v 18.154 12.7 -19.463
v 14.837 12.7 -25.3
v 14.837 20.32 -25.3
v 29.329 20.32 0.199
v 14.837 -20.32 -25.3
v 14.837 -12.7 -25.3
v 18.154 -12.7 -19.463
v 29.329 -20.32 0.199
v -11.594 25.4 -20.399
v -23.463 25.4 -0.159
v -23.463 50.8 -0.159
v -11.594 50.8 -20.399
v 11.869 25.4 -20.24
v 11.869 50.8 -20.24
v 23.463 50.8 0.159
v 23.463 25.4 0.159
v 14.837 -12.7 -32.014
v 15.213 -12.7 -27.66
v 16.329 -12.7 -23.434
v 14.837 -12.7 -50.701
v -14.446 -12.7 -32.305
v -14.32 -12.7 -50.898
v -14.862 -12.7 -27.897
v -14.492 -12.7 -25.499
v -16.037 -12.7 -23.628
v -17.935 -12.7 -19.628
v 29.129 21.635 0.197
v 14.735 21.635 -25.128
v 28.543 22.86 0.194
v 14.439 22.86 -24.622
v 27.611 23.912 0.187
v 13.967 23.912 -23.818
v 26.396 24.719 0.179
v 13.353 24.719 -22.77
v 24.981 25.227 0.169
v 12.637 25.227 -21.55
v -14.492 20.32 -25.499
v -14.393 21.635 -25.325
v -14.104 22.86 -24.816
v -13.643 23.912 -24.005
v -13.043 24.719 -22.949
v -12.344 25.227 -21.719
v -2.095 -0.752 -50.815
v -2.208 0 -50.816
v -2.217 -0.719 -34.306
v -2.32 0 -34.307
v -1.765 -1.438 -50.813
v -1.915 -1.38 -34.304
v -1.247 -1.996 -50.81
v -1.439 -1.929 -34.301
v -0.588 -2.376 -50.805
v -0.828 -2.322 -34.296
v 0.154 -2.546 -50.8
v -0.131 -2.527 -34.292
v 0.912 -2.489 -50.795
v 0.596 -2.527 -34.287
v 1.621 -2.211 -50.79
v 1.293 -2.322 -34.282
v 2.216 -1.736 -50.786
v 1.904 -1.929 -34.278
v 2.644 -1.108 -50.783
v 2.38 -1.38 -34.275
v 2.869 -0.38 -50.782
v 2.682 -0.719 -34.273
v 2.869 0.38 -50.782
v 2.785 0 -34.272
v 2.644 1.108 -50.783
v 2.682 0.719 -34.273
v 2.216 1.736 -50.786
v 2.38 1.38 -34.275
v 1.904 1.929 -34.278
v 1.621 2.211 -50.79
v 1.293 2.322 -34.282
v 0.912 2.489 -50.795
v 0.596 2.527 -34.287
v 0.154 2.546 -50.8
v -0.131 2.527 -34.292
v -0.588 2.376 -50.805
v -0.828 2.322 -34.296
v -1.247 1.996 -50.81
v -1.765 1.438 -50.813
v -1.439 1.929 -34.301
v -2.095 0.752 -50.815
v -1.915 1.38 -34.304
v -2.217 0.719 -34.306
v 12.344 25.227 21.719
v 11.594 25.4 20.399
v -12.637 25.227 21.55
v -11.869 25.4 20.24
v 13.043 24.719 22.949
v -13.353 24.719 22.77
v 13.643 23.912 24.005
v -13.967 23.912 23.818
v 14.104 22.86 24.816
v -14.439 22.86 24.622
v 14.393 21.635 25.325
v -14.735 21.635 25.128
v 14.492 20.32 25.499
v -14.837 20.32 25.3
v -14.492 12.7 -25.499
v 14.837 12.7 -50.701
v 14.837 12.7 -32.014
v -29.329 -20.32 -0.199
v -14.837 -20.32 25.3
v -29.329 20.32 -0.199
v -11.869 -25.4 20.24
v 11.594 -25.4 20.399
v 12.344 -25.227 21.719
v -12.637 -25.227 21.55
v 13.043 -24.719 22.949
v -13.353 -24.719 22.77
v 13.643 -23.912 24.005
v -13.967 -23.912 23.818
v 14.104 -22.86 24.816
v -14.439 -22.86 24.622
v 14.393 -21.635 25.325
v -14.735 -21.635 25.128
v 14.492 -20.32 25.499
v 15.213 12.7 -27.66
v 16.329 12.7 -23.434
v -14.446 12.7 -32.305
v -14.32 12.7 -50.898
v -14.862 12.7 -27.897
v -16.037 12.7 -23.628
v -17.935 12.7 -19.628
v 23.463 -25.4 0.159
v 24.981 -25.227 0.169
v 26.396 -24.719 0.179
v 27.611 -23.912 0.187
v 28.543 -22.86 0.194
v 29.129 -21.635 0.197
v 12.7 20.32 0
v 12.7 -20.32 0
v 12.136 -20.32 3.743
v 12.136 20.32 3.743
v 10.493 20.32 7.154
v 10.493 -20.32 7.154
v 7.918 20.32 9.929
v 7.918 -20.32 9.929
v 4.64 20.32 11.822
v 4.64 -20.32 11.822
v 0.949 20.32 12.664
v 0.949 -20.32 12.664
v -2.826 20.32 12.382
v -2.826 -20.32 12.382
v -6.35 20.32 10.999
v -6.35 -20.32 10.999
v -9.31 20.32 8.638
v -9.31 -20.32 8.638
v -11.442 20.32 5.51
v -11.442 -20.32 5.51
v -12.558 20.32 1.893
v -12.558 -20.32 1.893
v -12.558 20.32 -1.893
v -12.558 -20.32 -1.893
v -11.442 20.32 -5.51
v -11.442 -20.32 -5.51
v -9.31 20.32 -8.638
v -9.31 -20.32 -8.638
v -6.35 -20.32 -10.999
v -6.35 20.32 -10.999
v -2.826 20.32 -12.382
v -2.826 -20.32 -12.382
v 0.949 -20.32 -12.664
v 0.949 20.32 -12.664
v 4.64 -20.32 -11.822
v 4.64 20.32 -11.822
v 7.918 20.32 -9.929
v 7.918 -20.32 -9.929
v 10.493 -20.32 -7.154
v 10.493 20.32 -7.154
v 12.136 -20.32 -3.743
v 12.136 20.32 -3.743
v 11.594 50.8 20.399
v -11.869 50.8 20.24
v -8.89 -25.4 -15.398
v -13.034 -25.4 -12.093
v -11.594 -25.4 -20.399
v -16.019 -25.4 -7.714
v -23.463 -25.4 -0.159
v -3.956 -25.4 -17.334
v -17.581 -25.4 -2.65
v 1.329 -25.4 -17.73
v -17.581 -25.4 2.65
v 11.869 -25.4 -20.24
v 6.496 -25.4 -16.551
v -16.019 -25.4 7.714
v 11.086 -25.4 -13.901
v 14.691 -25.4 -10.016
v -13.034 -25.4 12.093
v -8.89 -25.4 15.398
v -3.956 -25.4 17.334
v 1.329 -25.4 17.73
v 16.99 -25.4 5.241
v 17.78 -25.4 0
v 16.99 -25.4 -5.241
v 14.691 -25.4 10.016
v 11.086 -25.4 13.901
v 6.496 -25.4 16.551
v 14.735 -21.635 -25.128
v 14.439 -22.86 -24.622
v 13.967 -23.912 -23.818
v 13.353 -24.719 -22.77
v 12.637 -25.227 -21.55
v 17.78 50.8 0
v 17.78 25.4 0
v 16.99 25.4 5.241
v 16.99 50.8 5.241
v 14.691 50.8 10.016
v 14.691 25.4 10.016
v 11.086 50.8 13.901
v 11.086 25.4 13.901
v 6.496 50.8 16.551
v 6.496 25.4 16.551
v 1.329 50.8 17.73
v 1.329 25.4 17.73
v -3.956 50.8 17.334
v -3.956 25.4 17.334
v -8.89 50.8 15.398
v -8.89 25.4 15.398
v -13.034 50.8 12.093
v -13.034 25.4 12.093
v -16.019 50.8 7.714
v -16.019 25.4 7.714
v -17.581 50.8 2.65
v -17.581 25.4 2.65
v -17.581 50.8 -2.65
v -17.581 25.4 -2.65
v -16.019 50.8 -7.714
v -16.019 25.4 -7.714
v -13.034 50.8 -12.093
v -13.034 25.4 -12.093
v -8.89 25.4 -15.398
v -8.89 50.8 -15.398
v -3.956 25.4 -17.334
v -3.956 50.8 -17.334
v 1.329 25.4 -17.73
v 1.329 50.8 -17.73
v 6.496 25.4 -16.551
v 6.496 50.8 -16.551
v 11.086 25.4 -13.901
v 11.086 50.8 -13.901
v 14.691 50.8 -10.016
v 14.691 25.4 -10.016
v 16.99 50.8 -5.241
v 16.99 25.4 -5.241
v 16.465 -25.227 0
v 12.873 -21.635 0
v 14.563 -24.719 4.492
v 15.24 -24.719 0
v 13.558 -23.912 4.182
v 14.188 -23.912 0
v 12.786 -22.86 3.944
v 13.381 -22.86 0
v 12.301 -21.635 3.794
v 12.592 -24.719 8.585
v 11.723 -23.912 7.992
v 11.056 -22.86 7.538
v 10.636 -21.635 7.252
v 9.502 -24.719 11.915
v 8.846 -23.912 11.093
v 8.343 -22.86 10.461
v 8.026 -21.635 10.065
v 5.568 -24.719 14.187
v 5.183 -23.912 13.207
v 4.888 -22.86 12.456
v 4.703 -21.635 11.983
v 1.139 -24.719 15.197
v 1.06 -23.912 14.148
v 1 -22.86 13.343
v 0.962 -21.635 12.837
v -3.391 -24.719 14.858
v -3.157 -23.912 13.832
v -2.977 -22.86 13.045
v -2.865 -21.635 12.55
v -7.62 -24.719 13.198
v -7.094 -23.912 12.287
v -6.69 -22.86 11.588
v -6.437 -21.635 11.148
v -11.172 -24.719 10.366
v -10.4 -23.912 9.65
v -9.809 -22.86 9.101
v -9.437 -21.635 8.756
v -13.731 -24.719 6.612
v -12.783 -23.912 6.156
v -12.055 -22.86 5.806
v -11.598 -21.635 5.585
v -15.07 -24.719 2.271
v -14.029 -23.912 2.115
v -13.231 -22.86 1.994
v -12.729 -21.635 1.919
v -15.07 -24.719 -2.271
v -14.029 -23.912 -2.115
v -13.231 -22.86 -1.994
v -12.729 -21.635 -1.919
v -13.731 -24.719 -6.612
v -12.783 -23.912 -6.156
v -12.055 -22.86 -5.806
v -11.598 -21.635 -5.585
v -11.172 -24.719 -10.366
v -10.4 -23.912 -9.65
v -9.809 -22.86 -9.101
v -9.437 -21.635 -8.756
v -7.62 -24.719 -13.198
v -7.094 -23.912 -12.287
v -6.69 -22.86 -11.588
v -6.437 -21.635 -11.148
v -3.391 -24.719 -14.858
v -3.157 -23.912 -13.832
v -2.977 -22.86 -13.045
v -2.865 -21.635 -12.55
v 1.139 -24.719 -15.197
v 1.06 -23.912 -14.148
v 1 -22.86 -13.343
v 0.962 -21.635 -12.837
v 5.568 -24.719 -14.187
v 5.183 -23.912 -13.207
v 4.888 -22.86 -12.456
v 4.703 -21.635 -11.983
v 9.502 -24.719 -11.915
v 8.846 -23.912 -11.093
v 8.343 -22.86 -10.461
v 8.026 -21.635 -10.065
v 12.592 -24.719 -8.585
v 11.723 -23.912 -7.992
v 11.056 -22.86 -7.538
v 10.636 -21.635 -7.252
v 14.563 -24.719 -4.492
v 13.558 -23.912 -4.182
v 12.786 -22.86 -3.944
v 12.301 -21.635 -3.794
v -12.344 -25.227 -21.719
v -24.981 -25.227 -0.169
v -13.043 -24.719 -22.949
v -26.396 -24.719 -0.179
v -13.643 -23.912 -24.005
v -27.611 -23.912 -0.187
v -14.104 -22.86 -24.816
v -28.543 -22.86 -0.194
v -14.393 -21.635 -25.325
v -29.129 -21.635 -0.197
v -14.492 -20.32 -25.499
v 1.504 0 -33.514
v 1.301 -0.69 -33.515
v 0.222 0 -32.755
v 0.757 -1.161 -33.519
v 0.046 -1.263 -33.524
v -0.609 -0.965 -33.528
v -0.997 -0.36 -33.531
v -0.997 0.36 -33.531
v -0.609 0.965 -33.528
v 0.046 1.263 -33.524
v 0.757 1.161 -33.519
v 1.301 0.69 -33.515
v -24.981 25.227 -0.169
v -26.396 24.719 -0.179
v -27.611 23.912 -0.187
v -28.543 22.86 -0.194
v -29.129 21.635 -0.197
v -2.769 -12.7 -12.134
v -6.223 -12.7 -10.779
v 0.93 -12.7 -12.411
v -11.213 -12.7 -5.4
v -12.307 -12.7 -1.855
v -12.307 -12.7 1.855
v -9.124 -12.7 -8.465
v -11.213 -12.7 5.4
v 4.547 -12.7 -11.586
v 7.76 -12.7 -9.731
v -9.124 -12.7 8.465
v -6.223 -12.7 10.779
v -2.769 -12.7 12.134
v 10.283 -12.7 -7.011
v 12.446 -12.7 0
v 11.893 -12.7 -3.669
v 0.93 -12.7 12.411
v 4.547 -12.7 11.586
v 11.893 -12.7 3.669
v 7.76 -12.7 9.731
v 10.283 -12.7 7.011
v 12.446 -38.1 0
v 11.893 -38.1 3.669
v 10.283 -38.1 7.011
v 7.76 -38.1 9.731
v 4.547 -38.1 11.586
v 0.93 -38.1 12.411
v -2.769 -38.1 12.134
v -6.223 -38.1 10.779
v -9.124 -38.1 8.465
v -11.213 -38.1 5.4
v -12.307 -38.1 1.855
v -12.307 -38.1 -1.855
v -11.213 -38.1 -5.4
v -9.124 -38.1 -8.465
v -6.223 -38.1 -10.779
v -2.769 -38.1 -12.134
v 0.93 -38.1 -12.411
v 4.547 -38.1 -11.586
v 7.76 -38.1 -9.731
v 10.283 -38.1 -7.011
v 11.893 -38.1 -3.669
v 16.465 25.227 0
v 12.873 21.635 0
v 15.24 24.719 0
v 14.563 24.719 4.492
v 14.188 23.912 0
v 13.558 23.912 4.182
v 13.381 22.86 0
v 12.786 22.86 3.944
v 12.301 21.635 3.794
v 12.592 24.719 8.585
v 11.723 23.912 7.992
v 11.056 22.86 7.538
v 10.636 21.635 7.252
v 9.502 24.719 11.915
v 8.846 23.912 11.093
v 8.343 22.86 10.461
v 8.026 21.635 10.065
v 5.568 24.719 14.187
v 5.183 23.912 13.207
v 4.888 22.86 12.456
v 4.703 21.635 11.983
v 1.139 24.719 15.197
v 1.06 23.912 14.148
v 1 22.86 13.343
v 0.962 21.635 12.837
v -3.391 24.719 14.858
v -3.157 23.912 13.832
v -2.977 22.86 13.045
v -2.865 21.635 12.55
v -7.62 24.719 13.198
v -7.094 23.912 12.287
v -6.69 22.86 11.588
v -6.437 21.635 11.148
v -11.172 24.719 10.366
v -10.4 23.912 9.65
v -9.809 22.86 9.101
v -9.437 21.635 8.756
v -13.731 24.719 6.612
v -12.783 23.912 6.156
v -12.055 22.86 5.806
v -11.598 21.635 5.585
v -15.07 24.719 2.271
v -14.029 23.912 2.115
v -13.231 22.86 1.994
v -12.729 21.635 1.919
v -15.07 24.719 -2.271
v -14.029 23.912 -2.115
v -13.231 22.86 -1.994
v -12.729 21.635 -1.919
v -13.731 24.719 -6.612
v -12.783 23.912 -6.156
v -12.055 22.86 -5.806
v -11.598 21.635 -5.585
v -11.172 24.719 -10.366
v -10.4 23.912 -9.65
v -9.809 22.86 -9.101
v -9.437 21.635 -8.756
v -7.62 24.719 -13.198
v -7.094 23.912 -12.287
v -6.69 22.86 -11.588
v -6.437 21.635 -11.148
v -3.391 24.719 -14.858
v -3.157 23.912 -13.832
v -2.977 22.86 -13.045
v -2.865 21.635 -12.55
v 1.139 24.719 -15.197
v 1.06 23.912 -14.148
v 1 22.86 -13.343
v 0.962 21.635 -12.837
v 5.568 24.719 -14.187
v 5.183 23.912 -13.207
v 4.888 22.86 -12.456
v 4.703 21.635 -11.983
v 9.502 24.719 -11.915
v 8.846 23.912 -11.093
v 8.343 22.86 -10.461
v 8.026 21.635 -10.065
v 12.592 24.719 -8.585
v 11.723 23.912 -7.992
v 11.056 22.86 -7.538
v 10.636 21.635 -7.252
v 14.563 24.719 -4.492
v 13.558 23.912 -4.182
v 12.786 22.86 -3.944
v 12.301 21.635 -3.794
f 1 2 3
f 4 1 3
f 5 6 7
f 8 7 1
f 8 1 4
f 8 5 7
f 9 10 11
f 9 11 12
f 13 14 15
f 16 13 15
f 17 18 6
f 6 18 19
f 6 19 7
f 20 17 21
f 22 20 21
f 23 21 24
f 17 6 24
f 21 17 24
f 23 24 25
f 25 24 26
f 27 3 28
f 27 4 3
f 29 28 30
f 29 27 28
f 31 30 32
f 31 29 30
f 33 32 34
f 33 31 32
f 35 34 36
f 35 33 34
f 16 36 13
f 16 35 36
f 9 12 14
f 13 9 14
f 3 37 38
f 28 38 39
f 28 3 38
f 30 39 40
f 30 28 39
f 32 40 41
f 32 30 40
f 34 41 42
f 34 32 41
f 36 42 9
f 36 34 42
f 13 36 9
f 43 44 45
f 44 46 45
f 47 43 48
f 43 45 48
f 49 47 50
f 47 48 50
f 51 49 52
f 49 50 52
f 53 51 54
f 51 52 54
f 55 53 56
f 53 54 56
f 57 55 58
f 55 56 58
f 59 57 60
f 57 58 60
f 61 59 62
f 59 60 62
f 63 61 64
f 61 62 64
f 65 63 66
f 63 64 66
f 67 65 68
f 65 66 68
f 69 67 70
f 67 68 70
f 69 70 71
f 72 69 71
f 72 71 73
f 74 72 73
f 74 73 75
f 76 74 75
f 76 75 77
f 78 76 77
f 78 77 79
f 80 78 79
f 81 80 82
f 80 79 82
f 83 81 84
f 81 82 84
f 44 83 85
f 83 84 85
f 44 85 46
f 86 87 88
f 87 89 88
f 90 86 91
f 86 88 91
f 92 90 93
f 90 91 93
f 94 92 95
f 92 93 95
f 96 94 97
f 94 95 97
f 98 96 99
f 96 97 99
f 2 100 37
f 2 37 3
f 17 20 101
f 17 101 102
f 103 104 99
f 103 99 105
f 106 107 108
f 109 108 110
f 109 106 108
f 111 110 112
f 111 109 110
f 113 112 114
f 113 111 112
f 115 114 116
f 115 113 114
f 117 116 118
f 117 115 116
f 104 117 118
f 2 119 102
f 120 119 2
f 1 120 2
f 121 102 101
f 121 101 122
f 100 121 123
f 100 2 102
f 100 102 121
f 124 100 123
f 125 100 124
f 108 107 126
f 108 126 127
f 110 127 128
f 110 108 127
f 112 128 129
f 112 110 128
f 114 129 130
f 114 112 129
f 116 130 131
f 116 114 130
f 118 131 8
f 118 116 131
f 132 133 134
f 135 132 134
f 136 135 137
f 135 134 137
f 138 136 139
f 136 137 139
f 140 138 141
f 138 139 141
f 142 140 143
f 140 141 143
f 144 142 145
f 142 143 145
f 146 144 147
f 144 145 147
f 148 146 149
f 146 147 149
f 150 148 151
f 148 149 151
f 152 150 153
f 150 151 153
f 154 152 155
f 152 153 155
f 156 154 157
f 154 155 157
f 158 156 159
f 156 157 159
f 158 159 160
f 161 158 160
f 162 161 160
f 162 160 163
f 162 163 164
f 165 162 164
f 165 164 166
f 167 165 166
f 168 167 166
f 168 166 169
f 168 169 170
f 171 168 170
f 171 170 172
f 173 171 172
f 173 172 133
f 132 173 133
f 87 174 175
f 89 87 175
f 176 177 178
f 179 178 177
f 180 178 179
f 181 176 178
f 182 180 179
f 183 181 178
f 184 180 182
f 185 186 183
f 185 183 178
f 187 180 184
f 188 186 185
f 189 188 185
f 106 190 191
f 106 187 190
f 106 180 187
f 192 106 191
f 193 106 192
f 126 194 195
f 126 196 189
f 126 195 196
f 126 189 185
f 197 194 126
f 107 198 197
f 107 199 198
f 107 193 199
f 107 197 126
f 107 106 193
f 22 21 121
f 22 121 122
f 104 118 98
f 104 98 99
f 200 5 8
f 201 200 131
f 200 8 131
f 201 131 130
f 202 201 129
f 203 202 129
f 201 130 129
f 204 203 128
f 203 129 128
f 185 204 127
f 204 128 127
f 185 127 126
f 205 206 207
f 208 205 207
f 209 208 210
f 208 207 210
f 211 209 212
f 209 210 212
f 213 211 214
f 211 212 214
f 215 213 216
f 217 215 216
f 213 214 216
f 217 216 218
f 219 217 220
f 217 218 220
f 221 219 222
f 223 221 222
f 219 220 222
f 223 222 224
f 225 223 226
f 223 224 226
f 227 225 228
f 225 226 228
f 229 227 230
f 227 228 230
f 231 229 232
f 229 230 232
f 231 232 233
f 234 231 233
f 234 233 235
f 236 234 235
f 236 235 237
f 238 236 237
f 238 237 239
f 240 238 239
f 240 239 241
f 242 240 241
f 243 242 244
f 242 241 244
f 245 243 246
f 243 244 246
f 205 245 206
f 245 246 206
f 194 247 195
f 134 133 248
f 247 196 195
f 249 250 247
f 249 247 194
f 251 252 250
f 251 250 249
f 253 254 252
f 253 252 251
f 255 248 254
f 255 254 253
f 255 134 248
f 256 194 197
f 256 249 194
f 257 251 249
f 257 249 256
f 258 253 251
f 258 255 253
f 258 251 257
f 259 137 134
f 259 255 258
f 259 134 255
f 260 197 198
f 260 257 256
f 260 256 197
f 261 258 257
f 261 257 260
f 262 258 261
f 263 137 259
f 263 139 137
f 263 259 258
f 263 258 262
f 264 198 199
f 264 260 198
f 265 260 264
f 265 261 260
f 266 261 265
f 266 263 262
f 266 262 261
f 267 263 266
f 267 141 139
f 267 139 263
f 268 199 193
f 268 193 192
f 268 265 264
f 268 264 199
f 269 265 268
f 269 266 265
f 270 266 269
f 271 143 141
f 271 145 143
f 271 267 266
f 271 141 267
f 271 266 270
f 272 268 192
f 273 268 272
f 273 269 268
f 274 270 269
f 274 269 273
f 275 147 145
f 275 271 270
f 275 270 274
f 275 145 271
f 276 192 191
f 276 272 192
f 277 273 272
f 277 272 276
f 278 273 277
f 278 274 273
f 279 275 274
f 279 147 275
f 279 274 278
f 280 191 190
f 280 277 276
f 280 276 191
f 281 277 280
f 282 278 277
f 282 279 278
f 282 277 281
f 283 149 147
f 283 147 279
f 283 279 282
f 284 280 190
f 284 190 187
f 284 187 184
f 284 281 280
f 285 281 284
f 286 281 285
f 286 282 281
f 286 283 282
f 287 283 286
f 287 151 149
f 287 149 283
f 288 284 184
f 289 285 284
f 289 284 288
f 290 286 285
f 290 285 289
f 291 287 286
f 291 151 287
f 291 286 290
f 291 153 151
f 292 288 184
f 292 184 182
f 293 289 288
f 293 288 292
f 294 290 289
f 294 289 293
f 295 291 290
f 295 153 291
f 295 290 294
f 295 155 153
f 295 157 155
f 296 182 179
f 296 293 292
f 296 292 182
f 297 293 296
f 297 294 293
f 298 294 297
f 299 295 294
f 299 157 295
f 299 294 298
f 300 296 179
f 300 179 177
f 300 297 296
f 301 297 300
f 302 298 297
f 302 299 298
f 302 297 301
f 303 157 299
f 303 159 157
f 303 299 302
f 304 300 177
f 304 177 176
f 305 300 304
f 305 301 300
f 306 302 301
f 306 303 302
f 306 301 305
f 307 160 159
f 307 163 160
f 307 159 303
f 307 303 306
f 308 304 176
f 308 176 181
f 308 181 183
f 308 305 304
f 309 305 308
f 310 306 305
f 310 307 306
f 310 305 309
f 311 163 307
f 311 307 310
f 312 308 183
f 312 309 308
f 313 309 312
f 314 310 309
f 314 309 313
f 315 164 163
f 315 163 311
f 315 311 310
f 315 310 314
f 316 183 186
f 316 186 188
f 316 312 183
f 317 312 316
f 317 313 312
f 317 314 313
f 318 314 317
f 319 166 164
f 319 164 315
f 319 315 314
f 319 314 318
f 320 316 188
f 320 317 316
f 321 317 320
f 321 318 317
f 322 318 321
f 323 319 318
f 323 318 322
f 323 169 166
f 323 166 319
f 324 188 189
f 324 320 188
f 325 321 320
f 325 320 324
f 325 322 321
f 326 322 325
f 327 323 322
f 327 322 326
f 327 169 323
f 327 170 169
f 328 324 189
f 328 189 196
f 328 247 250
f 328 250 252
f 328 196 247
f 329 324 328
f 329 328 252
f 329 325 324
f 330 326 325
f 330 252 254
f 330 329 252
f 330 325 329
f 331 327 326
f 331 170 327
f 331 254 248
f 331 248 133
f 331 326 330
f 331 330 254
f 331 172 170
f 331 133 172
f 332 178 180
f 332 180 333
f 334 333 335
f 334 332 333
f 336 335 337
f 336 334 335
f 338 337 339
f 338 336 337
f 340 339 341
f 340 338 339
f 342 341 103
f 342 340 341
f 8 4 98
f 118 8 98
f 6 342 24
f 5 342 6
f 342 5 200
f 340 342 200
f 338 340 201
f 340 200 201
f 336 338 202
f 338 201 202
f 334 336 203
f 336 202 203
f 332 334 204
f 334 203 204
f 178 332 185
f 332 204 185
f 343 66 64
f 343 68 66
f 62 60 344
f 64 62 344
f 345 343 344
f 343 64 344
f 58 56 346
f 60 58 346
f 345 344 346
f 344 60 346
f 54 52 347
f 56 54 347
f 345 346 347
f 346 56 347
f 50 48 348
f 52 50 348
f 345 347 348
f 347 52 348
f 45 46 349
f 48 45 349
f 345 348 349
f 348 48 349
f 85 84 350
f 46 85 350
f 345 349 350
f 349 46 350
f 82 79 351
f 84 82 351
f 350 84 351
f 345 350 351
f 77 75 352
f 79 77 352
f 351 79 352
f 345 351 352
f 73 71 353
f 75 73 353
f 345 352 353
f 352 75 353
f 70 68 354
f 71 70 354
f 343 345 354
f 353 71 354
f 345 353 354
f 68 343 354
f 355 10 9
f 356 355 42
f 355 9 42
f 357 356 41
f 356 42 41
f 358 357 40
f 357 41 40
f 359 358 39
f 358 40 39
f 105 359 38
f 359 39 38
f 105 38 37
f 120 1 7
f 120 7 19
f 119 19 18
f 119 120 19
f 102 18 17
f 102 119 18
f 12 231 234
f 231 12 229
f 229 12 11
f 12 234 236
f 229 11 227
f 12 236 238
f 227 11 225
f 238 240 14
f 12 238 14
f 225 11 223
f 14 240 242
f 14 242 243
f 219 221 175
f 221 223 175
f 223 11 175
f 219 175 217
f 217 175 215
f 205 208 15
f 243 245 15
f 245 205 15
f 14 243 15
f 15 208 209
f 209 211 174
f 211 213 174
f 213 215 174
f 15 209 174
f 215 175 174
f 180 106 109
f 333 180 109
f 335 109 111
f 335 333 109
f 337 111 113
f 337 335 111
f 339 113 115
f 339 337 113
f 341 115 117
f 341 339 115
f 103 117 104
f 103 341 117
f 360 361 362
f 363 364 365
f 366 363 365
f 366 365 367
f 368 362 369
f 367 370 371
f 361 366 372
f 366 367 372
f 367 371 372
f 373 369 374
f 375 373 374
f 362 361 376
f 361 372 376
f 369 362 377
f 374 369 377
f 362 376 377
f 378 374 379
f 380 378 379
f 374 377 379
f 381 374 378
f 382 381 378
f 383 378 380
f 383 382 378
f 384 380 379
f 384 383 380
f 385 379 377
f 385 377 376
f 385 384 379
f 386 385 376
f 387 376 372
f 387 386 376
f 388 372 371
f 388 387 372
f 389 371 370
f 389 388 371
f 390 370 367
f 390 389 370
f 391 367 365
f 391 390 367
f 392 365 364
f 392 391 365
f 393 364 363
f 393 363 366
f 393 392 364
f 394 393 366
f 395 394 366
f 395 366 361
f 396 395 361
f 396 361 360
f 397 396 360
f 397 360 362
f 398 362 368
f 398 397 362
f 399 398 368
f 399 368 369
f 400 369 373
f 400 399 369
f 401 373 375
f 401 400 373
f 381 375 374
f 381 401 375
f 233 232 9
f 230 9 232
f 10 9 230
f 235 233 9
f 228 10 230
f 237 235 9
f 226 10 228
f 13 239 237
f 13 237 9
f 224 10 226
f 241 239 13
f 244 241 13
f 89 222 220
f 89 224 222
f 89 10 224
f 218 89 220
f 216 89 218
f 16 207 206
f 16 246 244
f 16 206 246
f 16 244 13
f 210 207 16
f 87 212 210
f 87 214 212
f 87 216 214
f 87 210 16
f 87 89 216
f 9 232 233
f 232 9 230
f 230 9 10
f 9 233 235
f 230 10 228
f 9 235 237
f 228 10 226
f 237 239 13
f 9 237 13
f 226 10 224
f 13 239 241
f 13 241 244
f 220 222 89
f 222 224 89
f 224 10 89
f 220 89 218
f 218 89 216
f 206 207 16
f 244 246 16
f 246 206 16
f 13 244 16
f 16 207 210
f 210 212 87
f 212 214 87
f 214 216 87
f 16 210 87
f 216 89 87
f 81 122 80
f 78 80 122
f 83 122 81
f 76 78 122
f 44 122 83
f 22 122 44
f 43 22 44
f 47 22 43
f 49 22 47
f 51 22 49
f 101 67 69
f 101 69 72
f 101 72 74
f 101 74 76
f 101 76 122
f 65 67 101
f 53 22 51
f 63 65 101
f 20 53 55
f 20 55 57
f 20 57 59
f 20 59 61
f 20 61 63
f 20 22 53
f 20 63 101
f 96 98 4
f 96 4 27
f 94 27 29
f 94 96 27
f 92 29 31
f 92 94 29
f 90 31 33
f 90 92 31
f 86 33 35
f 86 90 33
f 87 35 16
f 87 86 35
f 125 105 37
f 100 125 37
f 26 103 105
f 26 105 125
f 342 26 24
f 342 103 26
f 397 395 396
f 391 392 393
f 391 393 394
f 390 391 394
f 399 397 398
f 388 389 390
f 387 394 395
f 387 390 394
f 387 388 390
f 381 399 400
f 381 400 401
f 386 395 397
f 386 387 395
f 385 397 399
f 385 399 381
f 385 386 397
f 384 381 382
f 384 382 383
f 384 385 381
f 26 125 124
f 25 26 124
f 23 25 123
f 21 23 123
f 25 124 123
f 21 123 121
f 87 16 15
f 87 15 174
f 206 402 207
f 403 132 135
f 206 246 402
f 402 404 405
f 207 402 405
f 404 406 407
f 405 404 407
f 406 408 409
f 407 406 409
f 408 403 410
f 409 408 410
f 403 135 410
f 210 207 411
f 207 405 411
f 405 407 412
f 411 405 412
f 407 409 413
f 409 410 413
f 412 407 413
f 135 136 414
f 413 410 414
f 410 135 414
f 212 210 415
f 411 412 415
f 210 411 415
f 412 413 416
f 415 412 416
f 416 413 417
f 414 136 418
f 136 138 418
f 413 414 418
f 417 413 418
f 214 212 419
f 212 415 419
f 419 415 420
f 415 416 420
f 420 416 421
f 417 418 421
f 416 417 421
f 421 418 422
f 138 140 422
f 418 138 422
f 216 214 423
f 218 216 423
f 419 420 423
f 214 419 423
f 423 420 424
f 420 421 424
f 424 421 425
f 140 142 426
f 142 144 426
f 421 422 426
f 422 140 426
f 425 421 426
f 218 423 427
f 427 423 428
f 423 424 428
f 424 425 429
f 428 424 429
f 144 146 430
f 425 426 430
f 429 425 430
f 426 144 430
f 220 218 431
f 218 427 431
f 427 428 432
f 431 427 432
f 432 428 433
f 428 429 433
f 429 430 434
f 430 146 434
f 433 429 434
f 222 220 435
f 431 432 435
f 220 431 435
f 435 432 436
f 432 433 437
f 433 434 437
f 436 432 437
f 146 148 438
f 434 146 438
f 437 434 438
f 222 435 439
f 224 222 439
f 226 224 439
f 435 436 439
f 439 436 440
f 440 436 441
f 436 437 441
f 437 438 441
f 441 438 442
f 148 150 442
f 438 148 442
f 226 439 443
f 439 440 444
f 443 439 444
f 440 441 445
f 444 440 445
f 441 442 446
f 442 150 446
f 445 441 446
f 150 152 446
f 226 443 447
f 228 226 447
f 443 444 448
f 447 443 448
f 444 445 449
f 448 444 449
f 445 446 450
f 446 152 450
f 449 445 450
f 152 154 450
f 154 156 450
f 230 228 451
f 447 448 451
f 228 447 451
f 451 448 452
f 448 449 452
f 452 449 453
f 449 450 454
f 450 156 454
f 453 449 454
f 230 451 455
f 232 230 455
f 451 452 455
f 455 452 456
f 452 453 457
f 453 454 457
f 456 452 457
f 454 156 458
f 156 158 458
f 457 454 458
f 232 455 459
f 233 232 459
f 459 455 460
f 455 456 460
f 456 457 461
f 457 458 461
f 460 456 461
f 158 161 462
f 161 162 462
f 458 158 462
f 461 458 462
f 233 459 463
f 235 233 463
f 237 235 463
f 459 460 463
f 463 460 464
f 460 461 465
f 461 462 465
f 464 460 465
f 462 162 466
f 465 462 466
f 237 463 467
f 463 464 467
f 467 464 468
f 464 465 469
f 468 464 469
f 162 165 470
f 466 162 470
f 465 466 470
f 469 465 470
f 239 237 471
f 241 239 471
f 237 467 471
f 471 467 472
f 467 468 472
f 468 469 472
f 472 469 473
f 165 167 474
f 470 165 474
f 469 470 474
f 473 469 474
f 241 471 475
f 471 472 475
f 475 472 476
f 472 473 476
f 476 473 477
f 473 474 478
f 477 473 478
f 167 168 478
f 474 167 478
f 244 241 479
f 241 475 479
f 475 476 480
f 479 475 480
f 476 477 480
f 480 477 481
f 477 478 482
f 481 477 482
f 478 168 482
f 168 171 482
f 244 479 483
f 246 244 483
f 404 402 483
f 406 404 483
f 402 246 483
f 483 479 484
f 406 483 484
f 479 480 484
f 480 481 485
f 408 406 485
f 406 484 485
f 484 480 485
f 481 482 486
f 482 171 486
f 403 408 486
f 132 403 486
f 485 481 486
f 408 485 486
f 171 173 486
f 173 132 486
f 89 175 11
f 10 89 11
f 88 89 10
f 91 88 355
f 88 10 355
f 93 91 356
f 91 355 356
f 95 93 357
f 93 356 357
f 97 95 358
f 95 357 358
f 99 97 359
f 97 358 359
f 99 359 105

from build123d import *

# Parameters (mm, degrees)
F1_DEPTH    = 25.4
F2_DEPTH    = 12.7
F3_T1_DEPTH = 25.4
F4_R        = 12.7
F5_DEPTH    = 50.801
F6_R        = 5.08
F8_D        = 5.1054
F8_DEPTH    = 16.51
F8_TIP      = 1.5338169022
F9_DEPTH    = 25.4
F10_R       = 12.446
F11_DEPTH   = 12.7


# Not quite as in the source:
# - a fillet or chamfer that OpenCascade refuses, or shapes differently, is made with other operations: its cross-section is extruded or revolved along the edge and cut away or added


with BuildPart() as f1:
    # F0 (on Front) → F1 (new body, symmetric)
    with BuildSketch(Plane.XZ):
        Polygon((14.8365712132, -25.2999898808), (29.3287195589, 0.1988526353), (14.4921483457, 25.4988425161), (-14.8365712132, 25.2999898808), (-29.3287195589, -0.1988526353), (-14.4921483457, -25.4988425161), align=None)
    extrude(amount=F1_DEPTH, both=True)

    # F0 (on Front) → F2 (join, symmetric)
    with BuildSketch(Plane.XZ):
        Polygon((14.8365712132, -50.7005736958), (14.8365712132, -25.2999898808), (-14.4921483457, -25.4988425161), (-14.3199369119, -50.8982587146), align=None)
    extrude(amount=F2_DEPTH, both=True)

    # F3: fillet of radius 25.4 on 6 edges, made by hand

    # F3_s2 → F3_t1 (join)
    with BuildSketch(Plane.XZ.offset(-12.7)):
        with BuildLine():
            ThreePointArc((18.1539258272, -19.463125611), (15.6799102756, -25.5229004766), (14.8365712132, -32.0136942337))
            Line((14.8365712132, -32.0136942337), (14.8365712132, -25.2999898808))
            Line((14.8365712132, -25.2999898808), (18.1539258272, -19.463125611))
        make_face()
        with BuildLine():
            ThreePointArc((-17.9349866772, -19.6279594328), (-15.3560401496, -25.7366108904), (-14.446004431, -32.3045955747))
            Line((-14.446004431, -32.3045955747), (-14.4921483457, -25.4988425161))
            Line((-14.4921483457, -25.4988425161), (-17.9349866772, -19.6279594328))
        make_face()
    extrude(amount=F3_T1_DEPTH)

    # F4 (on face) → F5 (cut, through all)
    with BuildSketch(Plane.XZ.offset(25.4)):
        Circle(F4_R)
    extrude(amount=-F5_DEPTH, mode=Mode.SUBTRACT)

    # F6
    f6_edges = [f1.edges().sort_by_distance(p)[0] for p in [
        (-21.910434, -25.4, -12.848848),
        (-22.082645, -25.4, 12.550569),
        (0.172211, -25.4, -25.399416),
        (-0.172211, -25.4, 25.399416),
        (22.082645, -25.4, -12.550569),
        (21.910434, -25.4, 12.848848),
        (-12.7, -25.4, 0),
        (-21.910434, 25.4, -12.848848),
        (-22.082645, 25.4, 12.550569),
        (0.172211, 25.4, -25.399416),
        (-0.172211, 25.4, 25.399416),
        (22.082645, 25.4, -12.550569),
        (21.910434, 25.4, 12.848848),
        (-12.7, 25.4, 0),
    ]]
    fillet(f6_edges, radius=F6_R)

    # F8
    with Locations(Plane(origin=(0.3444228676, 0, -50.7988323969), x_dir=(0.9999770157, 0, 0.0067799777), z_dir=(0.0067799777, 0, -0.9999770157))):
        with Locations((0, 0)):
            Hole(F8_D / 2, depth=F8_DEPTH)
            with Locations((0, 0, -(F8_DEPTH + F8_TIP / 2))):  # 118° drill point
                Cone(0, F8_D / 2, F8_TIP, mode=Mode.SUBTRACT)


with BuildPart() as f9:
    # F9 (new): a face of the model
    f9_faces = [f1.part.faces().sort_by_distance(p)[0] for p in [
        (-16.9919602561, 25.4, -9.9645268468),
    ]]
    extrude(f9_faces, amount=F9_DEPTH)


with BuildPart() as f11:
    # F10 (on face) → F11 (new body, symmetric)
    with BuildSketch(Plane.XZ.offset(25.4)):
        Circle(F10_R)
    extrude(amount=F11_DEPTH, both=True)


solid = Compound([f1.part, f9.part, f11.part])
